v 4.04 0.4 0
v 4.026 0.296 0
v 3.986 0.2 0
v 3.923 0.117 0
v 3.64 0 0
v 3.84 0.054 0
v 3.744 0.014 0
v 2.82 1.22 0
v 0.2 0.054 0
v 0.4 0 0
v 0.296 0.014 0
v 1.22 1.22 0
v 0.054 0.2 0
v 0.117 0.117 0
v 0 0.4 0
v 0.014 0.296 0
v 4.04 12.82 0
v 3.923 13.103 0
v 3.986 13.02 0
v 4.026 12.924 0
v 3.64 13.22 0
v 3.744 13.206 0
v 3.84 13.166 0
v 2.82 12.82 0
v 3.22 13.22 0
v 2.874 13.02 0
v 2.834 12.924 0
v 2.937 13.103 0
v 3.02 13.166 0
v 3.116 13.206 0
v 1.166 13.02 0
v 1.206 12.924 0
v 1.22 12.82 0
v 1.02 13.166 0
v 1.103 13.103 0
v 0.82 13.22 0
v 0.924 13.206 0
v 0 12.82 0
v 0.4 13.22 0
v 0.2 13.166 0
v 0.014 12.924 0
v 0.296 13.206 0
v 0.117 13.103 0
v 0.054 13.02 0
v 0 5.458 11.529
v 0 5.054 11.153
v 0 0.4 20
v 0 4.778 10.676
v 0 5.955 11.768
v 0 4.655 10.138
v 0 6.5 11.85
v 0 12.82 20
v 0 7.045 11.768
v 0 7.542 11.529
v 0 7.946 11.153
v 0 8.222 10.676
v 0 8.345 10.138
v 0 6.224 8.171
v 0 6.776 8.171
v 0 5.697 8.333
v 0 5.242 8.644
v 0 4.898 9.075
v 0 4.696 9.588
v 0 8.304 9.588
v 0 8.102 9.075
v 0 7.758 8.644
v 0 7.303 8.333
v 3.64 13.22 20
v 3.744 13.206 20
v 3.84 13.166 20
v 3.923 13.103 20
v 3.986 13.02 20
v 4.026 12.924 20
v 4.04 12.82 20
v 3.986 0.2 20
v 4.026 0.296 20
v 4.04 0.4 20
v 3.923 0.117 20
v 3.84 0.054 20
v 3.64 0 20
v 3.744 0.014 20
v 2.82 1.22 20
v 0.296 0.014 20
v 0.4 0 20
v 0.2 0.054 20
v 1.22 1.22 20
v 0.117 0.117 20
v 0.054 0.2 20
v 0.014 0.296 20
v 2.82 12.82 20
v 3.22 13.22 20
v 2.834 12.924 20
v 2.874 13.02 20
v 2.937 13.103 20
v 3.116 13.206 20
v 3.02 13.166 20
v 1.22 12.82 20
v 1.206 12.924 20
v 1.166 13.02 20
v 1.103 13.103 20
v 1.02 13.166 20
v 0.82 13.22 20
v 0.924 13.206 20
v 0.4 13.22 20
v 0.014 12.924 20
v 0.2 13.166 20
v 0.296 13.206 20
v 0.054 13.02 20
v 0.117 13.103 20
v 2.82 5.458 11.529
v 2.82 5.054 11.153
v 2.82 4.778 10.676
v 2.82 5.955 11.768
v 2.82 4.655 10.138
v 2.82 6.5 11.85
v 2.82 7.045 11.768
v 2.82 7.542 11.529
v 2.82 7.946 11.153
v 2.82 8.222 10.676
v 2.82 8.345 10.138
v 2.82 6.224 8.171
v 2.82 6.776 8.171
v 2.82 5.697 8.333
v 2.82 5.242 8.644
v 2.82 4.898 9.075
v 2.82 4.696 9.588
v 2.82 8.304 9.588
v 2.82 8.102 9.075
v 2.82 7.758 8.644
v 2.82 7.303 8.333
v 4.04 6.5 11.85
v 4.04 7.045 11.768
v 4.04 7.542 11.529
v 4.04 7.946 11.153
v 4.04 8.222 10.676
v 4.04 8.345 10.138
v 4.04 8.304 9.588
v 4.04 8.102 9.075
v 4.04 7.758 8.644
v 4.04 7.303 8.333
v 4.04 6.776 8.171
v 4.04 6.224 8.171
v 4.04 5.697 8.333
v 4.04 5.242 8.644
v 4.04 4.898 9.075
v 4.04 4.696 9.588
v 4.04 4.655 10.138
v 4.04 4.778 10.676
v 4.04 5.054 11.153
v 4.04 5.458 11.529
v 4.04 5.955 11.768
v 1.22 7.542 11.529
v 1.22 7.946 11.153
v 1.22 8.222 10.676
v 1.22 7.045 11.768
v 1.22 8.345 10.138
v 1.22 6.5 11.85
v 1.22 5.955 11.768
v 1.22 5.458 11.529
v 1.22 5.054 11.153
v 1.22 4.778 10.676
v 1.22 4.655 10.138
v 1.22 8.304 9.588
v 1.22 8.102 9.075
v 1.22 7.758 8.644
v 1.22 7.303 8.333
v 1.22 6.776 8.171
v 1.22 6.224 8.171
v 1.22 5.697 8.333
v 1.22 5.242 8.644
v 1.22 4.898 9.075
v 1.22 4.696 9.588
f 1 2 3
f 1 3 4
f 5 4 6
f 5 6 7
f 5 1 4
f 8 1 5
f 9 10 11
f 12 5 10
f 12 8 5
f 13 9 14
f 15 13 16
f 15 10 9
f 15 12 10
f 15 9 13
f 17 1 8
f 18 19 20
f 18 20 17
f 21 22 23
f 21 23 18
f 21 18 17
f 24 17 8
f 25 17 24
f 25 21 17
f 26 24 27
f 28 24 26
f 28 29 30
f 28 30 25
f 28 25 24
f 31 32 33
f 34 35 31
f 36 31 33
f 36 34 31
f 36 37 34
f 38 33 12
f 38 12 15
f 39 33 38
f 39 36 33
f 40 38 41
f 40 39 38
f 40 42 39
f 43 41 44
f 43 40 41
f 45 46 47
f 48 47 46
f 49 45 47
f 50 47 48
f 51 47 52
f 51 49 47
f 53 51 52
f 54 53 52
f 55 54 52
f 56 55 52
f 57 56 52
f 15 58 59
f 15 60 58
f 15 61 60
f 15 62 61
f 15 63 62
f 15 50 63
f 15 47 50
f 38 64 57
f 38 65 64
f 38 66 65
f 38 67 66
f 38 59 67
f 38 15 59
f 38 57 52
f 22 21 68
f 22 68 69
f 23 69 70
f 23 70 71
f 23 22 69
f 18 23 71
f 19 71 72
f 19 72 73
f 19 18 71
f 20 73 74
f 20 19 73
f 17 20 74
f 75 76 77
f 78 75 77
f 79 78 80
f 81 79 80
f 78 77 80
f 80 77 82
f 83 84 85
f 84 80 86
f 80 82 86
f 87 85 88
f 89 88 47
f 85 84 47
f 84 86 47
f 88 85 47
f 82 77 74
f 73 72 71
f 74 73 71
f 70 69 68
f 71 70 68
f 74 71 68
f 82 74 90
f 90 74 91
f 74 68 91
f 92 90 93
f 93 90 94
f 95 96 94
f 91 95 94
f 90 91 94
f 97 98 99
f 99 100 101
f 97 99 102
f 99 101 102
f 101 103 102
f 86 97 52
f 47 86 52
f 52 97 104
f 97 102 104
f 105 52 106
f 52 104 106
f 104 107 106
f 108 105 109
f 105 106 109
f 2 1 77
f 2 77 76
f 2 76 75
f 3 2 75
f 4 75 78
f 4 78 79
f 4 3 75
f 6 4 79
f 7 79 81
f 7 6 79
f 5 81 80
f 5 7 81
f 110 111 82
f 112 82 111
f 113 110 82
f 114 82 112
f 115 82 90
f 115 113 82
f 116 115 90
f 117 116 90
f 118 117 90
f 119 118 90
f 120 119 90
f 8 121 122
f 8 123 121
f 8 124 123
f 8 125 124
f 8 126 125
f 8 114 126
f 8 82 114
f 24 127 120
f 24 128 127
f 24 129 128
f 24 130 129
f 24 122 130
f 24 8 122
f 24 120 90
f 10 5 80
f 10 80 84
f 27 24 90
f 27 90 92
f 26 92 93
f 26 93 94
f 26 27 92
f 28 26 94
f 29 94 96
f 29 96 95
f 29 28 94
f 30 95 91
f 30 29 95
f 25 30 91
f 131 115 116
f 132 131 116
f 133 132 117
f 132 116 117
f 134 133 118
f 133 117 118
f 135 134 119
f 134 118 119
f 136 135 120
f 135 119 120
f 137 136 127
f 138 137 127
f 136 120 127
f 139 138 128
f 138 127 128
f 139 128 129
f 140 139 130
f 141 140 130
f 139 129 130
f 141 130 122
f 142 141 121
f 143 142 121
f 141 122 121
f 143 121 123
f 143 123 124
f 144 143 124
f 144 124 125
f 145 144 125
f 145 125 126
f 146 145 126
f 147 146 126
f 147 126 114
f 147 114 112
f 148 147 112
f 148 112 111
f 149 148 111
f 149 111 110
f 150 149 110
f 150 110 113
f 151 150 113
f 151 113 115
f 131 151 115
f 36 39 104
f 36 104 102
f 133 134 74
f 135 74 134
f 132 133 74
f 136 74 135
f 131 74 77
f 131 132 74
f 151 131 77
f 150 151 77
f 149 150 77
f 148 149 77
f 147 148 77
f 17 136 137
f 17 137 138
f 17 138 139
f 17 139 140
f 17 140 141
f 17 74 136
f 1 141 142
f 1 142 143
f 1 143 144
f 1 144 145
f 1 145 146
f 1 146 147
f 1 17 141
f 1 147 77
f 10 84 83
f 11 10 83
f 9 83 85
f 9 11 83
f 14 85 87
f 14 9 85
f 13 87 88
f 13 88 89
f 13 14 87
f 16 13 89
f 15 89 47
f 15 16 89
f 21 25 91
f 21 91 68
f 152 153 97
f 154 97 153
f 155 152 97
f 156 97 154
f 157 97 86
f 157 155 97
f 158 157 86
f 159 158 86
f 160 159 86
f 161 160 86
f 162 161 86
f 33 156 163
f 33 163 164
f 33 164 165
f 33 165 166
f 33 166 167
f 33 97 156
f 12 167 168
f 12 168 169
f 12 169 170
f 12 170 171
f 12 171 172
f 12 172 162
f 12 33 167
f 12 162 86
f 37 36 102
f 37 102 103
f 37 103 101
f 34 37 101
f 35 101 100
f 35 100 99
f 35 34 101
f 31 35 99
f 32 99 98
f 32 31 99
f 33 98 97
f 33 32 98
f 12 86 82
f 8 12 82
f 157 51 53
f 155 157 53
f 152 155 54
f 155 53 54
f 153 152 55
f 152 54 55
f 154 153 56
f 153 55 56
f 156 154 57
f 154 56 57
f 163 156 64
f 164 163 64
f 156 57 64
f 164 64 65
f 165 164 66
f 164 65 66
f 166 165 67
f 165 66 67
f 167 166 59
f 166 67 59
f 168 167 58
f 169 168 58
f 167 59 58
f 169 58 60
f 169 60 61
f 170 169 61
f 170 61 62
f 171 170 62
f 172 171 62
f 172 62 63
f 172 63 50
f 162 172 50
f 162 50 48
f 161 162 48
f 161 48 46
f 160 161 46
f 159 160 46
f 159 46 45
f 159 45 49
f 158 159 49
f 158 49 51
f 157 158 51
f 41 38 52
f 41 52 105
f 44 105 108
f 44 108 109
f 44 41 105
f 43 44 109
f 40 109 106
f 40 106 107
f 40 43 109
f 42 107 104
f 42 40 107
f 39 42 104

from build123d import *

# Parameters (mm, degrees)
BOSS_EXTRUDE1_DEPTH = 20
CUT_EXTRUDE1_REACH  = 26.312
SKETCH2_R           = 1.85


with BuildPart() as part:
    # Sketch1 → Boss-Extrude1 (new body)
    with BuildSketch(Plane.XY):
        with BuildLine():
            Line((3.22, 13.22), (3.64, 13.22))
            ThreePointArc((3.64, 13.22), (3.922842712, 13.102842712), (4.04, 12.82))
            Line((4.04, 12.82), (4.04, 0.4))
            ThreePointArc((4.04, 0.4), (3.922842712, 0.117157288), (3.64, 0))
            Line((3.64, 0), (0.4, 0))
            ThreePointArc((0.4, 0), (0.117157288, 0.117157288), (0, 0.4))
            Line((0, 0.4), (0, 12.82))
            ThreePointArc((0, 12.82), (0.117157288, 13.102842712), (0.4, 13.22))
            Line((0.4, 13.22), (0.82, 13.22))
            ThreePointArc((0.82, 13.22), (1.102842712, 13.102842712), (1.22, 12.82))
            Line((1.22, 12.82), (1.22, 1.22))
            Line((1.22, 1.22), (2.82, 1.22))
            Line((2.82, 1.22), (2.82, 12.82))
            ThreePointArc((2.82, 12.82), (2.937157288, 13.102842712), (3.22, 13.22))
        make_face()
    extrude(amount=BOSS_EXTRUDE1_DEPTH)

    # Cut-Extrude1: up to this face of the body (flat: up to its plane)
    cut_extrude1_end = Plane(part.part.faces().sort_by_distance((4.04, 6.61, 10))[0])
    # Sketch2 → Cut-Extrude1 (cut, up to the picked face)
    with BuildSketch(Plane.ZY, mode=Mode.PRIVATE) as cut_extrude1_sk1:
        with Locations((10, 6.5)):
            Circle(SKETCH2_R)
    cut_extrude1_tool1 = split(extrude(cut_extrude1_sk1.sketch, amount=-CUT_EXTRUDE1_REACH, mode=Mode.PRIVATE), bisect_by=cut_extrude1_end, keep=Keep.BOTH, mode=Mode.PRIVATE)
    add(cut_extrude1_tool1.solids().sort_by(Axis((0, 6.5, 10), (1, 0, 0)))[0], mode=Mode.SUBTRACT)


solid = part.part
